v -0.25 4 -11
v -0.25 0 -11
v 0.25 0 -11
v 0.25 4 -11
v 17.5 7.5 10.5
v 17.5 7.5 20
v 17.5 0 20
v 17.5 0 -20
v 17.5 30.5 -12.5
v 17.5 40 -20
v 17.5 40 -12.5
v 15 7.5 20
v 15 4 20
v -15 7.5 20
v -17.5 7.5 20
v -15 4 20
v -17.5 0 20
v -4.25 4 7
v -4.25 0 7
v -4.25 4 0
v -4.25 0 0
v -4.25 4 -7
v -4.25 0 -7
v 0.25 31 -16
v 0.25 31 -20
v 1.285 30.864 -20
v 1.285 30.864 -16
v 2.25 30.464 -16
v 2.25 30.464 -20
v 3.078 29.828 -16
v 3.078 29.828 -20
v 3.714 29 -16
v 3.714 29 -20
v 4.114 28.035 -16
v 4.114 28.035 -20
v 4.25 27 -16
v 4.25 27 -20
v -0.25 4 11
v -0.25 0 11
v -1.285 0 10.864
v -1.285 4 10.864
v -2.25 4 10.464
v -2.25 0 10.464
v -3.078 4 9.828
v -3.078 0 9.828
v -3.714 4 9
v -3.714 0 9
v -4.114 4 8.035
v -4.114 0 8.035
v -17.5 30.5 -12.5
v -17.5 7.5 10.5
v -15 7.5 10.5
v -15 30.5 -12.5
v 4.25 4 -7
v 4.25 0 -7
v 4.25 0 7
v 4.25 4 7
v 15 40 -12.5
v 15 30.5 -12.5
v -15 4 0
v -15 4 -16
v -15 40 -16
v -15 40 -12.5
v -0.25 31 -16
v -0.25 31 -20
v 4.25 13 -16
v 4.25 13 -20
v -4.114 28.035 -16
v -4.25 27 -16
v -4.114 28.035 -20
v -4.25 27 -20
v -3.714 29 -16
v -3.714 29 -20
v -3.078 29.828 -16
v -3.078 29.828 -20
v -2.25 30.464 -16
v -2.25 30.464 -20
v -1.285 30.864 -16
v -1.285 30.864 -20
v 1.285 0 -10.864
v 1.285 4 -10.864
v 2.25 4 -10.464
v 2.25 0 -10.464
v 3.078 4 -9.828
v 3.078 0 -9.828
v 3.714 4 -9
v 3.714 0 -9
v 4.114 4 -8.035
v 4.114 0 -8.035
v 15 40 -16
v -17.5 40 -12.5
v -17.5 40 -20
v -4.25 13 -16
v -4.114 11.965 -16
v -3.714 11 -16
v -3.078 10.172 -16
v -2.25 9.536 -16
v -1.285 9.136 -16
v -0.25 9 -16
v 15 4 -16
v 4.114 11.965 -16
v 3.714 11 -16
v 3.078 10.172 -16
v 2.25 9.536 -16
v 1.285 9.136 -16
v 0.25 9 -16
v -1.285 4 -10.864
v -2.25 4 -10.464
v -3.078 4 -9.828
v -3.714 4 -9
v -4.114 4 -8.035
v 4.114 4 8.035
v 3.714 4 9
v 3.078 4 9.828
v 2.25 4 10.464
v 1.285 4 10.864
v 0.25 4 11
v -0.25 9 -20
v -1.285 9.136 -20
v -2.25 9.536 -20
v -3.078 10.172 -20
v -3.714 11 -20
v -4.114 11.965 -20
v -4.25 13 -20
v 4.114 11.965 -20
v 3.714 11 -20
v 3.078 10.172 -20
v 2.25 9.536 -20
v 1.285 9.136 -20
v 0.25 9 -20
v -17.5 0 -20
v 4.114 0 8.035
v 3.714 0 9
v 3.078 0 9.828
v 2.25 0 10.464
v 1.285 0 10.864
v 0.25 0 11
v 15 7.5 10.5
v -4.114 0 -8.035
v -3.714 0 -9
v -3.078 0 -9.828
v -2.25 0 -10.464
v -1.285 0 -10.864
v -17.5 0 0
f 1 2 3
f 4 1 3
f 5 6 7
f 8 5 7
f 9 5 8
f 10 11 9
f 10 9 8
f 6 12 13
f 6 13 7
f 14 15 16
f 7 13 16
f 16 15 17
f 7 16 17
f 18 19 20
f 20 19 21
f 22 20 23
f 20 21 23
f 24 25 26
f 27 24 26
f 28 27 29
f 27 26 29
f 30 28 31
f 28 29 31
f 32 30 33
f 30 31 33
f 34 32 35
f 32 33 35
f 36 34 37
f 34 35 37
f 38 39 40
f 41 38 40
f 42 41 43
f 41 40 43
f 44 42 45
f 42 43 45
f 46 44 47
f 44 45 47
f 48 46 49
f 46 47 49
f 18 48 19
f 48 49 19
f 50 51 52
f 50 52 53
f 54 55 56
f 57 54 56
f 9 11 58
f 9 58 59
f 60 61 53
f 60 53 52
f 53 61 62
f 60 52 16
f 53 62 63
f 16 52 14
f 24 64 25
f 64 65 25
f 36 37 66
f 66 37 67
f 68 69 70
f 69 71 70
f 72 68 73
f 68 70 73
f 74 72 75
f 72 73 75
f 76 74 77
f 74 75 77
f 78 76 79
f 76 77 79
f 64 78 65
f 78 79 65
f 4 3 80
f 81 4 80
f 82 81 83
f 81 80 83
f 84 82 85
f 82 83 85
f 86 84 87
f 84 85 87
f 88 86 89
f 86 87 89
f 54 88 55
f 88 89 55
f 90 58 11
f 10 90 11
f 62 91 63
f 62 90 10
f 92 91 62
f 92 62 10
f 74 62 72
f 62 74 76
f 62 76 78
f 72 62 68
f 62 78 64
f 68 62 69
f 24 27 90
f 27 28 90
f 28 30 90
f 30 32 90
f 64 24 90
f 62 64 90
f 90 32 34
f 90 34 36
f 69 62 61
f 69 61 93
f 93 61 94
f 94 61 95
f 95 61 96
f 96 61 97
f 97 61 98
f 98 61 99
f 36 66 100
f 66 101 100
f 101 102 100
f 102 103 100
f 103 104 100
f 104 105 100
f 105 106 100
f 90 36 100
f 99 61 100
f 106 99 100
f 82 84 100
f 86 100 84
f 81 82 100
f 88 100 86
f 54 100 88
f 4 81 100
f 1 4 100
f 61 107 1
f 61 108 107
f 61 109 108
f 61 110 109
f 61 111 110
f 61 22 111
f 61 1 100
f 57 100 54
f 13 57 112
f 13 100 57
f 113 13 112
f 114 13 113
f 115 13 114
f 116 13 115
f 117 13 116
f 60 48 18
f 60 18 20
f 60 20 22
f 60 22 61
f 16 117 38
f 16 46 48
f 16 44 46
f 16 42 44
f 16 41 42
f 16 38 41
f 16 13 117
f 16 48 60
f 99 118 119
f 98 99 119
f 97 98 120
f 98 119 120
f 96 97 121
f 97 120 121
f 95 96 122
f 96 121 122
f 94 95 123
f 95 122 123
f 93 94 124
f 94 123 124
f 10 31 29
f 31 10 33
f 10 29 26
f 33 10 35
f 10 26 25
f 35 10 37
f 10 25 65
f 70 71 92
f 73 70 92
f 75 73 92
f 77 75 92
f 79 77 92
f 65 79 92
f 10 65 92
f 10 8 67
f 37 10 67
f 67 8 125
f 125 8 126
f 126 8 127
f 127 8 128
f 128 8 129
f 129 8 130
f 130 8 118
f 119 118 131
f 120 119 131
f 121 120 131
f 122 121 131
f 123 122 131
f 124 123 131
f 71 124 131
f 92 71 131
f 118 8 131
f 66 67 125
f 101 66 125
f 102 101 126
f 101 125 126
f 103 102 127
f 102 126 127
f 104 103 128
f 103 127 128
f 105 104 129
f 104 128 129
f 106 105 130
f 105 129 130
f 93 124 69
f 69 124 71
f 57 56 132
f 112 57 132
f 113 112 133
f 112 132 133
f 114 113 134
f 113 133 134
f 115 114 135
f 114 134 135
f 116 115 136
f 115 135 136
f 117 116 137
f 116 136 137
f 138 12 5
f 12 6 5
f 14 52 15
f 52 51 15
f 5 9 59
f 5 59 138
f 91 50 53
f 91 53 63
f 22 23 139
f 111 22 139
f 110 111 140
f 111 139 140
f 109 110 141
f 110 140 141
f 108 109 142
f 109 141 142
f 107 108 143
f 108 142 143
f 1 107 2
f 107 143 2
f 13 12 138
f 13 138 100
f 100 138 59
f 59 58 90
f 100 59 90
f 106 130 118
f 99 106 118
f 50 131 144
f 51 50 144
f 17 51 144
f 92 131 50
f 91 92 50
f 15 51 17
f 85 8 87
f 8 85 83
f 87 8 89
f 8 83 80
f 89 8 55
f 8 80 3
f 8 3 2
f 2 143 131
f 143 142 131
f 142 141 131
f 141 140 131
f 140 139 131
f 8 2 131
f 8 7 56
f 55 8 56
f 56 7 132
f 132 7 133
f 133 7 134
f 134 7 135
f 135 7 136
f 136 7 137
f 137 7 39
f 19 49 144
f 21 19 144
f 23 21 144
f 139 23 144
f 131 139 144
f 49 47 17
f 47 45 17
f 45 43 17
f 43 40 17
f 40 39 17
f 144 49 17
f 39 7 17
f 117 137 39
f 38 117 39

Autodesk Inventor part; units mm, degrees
ref_plane "YZ Plane" through (0, 0, 0) normal (1, 0, 0) x (0, 1, 0)
ref_plane "XZ Plane" through (0, 0, 0) normal (0, 1, 0) x (-1, 0, 0)
ref_plane "XY Plane" through (0, 0, 0) normal (0, 0, 1) x (1, 0, 0)
sketch "Sketch1" plane through (0, 0, 0) normal (0, 1, 0) x (-1, 0, 0)
  line L0 (0, 0) -> (17.5, 0)
  line L1 (17.5, 0) -> (17.5, -20)
  line L2 (17.5, -20) -> (-17.5, -20)
  line L3 (-17.5, -20) -> (-17.5, 20)
  line L4 (-17.5, 20) -> (17.5, 20)
  line L5 (17.5, 20) -> (17.5, 0)
  line L6 (15, -17.5) -> (15, 0)
  line L7 (15, 0) -> (15, 17.5)
  line L8 (15, 17.5) -> (-15, 17.5)
  line L9 (-15, 17.5) -> (-15, -17.5)
  line L10 (-15, -17.5) -> (15, -17.5)
  line L11 (0, 0) -> (0, 11)
  line L12 (0, 0) -> (0, -11)
  line L13 (0, 0) -> (4.25, 0)
  line L14 (4.25, 0) -> (4.25, -7)
  line L15 (0.25, -11) -> (-0.25, -11)
  line L16 (-4.25, -7) -> (-4.25, 7)
  line L17 (-0.25, 11) -> (0.25, 11)
  line L18 (4.25, 7) -> (4.25, 0)
  arc A0 (4.25, 7) -> (0.25, 11) centre (0.25, 7) ccw
  arc A1 (-0.25, 11) -> (-4.25, 7) centre (-0.25, 7) ccw
  arc A2 (0.25, -11) -> (4.25, -7) centre (0.25, -7) ccw
  arc A3 (-4.25, -7) -> (-0.25, -11) centre (-0.25, -7) ccw
  point P0 (4.25, -11)
  point P1 (-4.25, -11)
  point P2 (4.25, 11)
  dimension "d2" = 17.5
  dimension "d3" = 20
  dimension "d4" = 35
  dimension "d5" = 40
  dimension "d6" = 35
  dimension "d7" = 2.5
  dimension "d8" = 11
  dimension "d9" = 11
  dimension "d10" = 4.25
  dimension "d11" = 8.5
  dimension "d12" = 4
extrude "Extrusion1" add sketch "Sketch1" along normal blind 4 contours L6 L10 L9 L8 L7 | L1 L2 L3 L4 L5
sketch "Sketch2" plane through (0, 4, 0) normal (0, 1, 0) x (1, 0, 0)
  line L0 (-17.5, -20) -> (17.5, -20) projected
  line L1 (17.5, -20) -> (17.5, 20) projected
  line L2 (17.5, 20) -> (-17.5, 20) projected
  line L3 (-17.5, 20) -> (-17.5, -20) projected
  line L4 (-4.25, -7) -> (-4.25, 7) projected
  arc A0 (-0.25, 11) -> (-4.25, 7) centre (-0.25, 7) ccw projected
  line L5 (-0.25, 11) -> (0.25, 11) projected
  arc A1 (4.25, 7) -> (0.25, 11) centre (0.25, 7) ccw projected
  line L6 (4.25, 7) -> (4.25, -7) projected
  arc A2 (0.25, -11) -> (4.25, -7) centre (0.25, -7) ccw projected
  line L7 (0.25, -11) -> (-0.25, -11) projected
  arc A3 (-4.25, -7) -> (-0.25, -11) centre (-0.25, -7) ccw projected
  line L8 (-17.5, 20) -> (-17.5, -20) projected
  line L9 (-17.5, 20) -> (-17.5, 16)
  line L10 (-17.5, 16) -> (17.5, 16)
  line L11 (17.5, -20) -> (17.5, 20) projected
  point P0 (0, 0)
  dimension "d15" = 4
extrude "Extrusion2" add sketch "Sketch2" along normal blind 36 contours L3 L2 L1 L10
sketch "Sketch3" plane through (17.5, 0, -20) normal (0, 0, -1) x (-1, 0, 0)
  line L0 (0, 0) -> (35, 0) projected
  line L1 (35, 0) -> (35, 40) projected
  line L2 (0, 40) -> (35, 40) projected
  line L3 (0, 0) -> (0, 40) projected
  line L4 (17.5, 0) -> (17.5, 40)
  line L5 (35, 40) -> (0, 40) projected
  line L6 (17.5, 20) -> (17.5, 9)
  line L7 (17.5, 20) -> (17.5, 31)
  line L8 (17.5, 31) -> (17.25, 31)
  line L9 (13.25, 27) -> (13.25, 13)
  line L10 (17.25, 9) -> (17.75, 9)
  line L11 (21.75, 13) -> (21.75, 27)
  line L12 (17.75, 31) -> (17.5, 31)
  arc A0 (13.25, 13) -> (17.25, 9) centre (17.25, 13) ccw
  arc A1 (17.75, 9) -> (21.75, 13) centre (17.75, 13) ccw
  arc A2 (17.25, 31) -> (13.25, 27) centre (17.25, 27) ccw
  arc A3 (21.75, 27) -> (17.75, 31) centre (17.75, 27) ccw
  point P0 (13.25, 31)
  point P1 (13.25, 9)
  point P2 (21.75, 9)
  point P3 (21.75, 31)
  dimension "d18" = 11
  dimension "d19" = 11
  dimension "d20" = 4.25
  dimension "d21" = 22
  dimension "d22" = 8.5
  dimension "d23" = 4
extrude "Extrusion3" cut sketch "Sketch3" against normal blind 4 contours L10 A0 L9 A2 L8 L4 | L4 L12 A3 L11 A1 L10
sketch "Sketch4" plane through (17.5, 0, 20) normal (1, 0, 0) x (0, 0, -1)
  line L0 (0, 0) -> (40, 0) projected
  line L1 (40, 0) -> (40, 40) projected
  line L2 (36, 40) -> (40, 40) projected
  line L3 (36, 4) -> (36, 40) projected
  line L4 (0, 4) -> (36, 4) projected
  line L5 (0, 0) -> (0, 4) projected
  line L6 (36, 4) -> (0, 4) projected
  line L7 (0, 4) -> (0, 7.5)
  line L8 (0, 7.5) -> (9.5, 7.5)
  line L9 (36, 4) -> (36, 40) projected
  line L10 (36, 40) -> (32.5, 40)
  line L11 (32.5, 40) -> (32.5, 30.5)
  line L12 (0, 7.5) -> (9.5, 7.5)
  line L13 (32.5, 40) -> (32.5, 30.5)
  line L14 (32.5, 30.5) -> (9.5, 7.5)
  point P0 (20, 0)
  dimension "d26" = 3.5
  dimension "d27" = 3.5
  dimension "d28" = 9.5
  dimension "d29" = 9.5
extrude "Extrusion4" add sketch "Sketch4" against normal blind 2.5 contours L7 L8 L14 L11 L10 L3 L4
mirror "Mirror1" about plane through (0, 0, 0) normal (1, 0, 0) of "Extrusion4"
ref_plane "Work Plane1" through (0, 0, 0) normal (1, 0, 0) x (0, 1, 0)
properties part number "KE HOC NHOM DINH HINH"
